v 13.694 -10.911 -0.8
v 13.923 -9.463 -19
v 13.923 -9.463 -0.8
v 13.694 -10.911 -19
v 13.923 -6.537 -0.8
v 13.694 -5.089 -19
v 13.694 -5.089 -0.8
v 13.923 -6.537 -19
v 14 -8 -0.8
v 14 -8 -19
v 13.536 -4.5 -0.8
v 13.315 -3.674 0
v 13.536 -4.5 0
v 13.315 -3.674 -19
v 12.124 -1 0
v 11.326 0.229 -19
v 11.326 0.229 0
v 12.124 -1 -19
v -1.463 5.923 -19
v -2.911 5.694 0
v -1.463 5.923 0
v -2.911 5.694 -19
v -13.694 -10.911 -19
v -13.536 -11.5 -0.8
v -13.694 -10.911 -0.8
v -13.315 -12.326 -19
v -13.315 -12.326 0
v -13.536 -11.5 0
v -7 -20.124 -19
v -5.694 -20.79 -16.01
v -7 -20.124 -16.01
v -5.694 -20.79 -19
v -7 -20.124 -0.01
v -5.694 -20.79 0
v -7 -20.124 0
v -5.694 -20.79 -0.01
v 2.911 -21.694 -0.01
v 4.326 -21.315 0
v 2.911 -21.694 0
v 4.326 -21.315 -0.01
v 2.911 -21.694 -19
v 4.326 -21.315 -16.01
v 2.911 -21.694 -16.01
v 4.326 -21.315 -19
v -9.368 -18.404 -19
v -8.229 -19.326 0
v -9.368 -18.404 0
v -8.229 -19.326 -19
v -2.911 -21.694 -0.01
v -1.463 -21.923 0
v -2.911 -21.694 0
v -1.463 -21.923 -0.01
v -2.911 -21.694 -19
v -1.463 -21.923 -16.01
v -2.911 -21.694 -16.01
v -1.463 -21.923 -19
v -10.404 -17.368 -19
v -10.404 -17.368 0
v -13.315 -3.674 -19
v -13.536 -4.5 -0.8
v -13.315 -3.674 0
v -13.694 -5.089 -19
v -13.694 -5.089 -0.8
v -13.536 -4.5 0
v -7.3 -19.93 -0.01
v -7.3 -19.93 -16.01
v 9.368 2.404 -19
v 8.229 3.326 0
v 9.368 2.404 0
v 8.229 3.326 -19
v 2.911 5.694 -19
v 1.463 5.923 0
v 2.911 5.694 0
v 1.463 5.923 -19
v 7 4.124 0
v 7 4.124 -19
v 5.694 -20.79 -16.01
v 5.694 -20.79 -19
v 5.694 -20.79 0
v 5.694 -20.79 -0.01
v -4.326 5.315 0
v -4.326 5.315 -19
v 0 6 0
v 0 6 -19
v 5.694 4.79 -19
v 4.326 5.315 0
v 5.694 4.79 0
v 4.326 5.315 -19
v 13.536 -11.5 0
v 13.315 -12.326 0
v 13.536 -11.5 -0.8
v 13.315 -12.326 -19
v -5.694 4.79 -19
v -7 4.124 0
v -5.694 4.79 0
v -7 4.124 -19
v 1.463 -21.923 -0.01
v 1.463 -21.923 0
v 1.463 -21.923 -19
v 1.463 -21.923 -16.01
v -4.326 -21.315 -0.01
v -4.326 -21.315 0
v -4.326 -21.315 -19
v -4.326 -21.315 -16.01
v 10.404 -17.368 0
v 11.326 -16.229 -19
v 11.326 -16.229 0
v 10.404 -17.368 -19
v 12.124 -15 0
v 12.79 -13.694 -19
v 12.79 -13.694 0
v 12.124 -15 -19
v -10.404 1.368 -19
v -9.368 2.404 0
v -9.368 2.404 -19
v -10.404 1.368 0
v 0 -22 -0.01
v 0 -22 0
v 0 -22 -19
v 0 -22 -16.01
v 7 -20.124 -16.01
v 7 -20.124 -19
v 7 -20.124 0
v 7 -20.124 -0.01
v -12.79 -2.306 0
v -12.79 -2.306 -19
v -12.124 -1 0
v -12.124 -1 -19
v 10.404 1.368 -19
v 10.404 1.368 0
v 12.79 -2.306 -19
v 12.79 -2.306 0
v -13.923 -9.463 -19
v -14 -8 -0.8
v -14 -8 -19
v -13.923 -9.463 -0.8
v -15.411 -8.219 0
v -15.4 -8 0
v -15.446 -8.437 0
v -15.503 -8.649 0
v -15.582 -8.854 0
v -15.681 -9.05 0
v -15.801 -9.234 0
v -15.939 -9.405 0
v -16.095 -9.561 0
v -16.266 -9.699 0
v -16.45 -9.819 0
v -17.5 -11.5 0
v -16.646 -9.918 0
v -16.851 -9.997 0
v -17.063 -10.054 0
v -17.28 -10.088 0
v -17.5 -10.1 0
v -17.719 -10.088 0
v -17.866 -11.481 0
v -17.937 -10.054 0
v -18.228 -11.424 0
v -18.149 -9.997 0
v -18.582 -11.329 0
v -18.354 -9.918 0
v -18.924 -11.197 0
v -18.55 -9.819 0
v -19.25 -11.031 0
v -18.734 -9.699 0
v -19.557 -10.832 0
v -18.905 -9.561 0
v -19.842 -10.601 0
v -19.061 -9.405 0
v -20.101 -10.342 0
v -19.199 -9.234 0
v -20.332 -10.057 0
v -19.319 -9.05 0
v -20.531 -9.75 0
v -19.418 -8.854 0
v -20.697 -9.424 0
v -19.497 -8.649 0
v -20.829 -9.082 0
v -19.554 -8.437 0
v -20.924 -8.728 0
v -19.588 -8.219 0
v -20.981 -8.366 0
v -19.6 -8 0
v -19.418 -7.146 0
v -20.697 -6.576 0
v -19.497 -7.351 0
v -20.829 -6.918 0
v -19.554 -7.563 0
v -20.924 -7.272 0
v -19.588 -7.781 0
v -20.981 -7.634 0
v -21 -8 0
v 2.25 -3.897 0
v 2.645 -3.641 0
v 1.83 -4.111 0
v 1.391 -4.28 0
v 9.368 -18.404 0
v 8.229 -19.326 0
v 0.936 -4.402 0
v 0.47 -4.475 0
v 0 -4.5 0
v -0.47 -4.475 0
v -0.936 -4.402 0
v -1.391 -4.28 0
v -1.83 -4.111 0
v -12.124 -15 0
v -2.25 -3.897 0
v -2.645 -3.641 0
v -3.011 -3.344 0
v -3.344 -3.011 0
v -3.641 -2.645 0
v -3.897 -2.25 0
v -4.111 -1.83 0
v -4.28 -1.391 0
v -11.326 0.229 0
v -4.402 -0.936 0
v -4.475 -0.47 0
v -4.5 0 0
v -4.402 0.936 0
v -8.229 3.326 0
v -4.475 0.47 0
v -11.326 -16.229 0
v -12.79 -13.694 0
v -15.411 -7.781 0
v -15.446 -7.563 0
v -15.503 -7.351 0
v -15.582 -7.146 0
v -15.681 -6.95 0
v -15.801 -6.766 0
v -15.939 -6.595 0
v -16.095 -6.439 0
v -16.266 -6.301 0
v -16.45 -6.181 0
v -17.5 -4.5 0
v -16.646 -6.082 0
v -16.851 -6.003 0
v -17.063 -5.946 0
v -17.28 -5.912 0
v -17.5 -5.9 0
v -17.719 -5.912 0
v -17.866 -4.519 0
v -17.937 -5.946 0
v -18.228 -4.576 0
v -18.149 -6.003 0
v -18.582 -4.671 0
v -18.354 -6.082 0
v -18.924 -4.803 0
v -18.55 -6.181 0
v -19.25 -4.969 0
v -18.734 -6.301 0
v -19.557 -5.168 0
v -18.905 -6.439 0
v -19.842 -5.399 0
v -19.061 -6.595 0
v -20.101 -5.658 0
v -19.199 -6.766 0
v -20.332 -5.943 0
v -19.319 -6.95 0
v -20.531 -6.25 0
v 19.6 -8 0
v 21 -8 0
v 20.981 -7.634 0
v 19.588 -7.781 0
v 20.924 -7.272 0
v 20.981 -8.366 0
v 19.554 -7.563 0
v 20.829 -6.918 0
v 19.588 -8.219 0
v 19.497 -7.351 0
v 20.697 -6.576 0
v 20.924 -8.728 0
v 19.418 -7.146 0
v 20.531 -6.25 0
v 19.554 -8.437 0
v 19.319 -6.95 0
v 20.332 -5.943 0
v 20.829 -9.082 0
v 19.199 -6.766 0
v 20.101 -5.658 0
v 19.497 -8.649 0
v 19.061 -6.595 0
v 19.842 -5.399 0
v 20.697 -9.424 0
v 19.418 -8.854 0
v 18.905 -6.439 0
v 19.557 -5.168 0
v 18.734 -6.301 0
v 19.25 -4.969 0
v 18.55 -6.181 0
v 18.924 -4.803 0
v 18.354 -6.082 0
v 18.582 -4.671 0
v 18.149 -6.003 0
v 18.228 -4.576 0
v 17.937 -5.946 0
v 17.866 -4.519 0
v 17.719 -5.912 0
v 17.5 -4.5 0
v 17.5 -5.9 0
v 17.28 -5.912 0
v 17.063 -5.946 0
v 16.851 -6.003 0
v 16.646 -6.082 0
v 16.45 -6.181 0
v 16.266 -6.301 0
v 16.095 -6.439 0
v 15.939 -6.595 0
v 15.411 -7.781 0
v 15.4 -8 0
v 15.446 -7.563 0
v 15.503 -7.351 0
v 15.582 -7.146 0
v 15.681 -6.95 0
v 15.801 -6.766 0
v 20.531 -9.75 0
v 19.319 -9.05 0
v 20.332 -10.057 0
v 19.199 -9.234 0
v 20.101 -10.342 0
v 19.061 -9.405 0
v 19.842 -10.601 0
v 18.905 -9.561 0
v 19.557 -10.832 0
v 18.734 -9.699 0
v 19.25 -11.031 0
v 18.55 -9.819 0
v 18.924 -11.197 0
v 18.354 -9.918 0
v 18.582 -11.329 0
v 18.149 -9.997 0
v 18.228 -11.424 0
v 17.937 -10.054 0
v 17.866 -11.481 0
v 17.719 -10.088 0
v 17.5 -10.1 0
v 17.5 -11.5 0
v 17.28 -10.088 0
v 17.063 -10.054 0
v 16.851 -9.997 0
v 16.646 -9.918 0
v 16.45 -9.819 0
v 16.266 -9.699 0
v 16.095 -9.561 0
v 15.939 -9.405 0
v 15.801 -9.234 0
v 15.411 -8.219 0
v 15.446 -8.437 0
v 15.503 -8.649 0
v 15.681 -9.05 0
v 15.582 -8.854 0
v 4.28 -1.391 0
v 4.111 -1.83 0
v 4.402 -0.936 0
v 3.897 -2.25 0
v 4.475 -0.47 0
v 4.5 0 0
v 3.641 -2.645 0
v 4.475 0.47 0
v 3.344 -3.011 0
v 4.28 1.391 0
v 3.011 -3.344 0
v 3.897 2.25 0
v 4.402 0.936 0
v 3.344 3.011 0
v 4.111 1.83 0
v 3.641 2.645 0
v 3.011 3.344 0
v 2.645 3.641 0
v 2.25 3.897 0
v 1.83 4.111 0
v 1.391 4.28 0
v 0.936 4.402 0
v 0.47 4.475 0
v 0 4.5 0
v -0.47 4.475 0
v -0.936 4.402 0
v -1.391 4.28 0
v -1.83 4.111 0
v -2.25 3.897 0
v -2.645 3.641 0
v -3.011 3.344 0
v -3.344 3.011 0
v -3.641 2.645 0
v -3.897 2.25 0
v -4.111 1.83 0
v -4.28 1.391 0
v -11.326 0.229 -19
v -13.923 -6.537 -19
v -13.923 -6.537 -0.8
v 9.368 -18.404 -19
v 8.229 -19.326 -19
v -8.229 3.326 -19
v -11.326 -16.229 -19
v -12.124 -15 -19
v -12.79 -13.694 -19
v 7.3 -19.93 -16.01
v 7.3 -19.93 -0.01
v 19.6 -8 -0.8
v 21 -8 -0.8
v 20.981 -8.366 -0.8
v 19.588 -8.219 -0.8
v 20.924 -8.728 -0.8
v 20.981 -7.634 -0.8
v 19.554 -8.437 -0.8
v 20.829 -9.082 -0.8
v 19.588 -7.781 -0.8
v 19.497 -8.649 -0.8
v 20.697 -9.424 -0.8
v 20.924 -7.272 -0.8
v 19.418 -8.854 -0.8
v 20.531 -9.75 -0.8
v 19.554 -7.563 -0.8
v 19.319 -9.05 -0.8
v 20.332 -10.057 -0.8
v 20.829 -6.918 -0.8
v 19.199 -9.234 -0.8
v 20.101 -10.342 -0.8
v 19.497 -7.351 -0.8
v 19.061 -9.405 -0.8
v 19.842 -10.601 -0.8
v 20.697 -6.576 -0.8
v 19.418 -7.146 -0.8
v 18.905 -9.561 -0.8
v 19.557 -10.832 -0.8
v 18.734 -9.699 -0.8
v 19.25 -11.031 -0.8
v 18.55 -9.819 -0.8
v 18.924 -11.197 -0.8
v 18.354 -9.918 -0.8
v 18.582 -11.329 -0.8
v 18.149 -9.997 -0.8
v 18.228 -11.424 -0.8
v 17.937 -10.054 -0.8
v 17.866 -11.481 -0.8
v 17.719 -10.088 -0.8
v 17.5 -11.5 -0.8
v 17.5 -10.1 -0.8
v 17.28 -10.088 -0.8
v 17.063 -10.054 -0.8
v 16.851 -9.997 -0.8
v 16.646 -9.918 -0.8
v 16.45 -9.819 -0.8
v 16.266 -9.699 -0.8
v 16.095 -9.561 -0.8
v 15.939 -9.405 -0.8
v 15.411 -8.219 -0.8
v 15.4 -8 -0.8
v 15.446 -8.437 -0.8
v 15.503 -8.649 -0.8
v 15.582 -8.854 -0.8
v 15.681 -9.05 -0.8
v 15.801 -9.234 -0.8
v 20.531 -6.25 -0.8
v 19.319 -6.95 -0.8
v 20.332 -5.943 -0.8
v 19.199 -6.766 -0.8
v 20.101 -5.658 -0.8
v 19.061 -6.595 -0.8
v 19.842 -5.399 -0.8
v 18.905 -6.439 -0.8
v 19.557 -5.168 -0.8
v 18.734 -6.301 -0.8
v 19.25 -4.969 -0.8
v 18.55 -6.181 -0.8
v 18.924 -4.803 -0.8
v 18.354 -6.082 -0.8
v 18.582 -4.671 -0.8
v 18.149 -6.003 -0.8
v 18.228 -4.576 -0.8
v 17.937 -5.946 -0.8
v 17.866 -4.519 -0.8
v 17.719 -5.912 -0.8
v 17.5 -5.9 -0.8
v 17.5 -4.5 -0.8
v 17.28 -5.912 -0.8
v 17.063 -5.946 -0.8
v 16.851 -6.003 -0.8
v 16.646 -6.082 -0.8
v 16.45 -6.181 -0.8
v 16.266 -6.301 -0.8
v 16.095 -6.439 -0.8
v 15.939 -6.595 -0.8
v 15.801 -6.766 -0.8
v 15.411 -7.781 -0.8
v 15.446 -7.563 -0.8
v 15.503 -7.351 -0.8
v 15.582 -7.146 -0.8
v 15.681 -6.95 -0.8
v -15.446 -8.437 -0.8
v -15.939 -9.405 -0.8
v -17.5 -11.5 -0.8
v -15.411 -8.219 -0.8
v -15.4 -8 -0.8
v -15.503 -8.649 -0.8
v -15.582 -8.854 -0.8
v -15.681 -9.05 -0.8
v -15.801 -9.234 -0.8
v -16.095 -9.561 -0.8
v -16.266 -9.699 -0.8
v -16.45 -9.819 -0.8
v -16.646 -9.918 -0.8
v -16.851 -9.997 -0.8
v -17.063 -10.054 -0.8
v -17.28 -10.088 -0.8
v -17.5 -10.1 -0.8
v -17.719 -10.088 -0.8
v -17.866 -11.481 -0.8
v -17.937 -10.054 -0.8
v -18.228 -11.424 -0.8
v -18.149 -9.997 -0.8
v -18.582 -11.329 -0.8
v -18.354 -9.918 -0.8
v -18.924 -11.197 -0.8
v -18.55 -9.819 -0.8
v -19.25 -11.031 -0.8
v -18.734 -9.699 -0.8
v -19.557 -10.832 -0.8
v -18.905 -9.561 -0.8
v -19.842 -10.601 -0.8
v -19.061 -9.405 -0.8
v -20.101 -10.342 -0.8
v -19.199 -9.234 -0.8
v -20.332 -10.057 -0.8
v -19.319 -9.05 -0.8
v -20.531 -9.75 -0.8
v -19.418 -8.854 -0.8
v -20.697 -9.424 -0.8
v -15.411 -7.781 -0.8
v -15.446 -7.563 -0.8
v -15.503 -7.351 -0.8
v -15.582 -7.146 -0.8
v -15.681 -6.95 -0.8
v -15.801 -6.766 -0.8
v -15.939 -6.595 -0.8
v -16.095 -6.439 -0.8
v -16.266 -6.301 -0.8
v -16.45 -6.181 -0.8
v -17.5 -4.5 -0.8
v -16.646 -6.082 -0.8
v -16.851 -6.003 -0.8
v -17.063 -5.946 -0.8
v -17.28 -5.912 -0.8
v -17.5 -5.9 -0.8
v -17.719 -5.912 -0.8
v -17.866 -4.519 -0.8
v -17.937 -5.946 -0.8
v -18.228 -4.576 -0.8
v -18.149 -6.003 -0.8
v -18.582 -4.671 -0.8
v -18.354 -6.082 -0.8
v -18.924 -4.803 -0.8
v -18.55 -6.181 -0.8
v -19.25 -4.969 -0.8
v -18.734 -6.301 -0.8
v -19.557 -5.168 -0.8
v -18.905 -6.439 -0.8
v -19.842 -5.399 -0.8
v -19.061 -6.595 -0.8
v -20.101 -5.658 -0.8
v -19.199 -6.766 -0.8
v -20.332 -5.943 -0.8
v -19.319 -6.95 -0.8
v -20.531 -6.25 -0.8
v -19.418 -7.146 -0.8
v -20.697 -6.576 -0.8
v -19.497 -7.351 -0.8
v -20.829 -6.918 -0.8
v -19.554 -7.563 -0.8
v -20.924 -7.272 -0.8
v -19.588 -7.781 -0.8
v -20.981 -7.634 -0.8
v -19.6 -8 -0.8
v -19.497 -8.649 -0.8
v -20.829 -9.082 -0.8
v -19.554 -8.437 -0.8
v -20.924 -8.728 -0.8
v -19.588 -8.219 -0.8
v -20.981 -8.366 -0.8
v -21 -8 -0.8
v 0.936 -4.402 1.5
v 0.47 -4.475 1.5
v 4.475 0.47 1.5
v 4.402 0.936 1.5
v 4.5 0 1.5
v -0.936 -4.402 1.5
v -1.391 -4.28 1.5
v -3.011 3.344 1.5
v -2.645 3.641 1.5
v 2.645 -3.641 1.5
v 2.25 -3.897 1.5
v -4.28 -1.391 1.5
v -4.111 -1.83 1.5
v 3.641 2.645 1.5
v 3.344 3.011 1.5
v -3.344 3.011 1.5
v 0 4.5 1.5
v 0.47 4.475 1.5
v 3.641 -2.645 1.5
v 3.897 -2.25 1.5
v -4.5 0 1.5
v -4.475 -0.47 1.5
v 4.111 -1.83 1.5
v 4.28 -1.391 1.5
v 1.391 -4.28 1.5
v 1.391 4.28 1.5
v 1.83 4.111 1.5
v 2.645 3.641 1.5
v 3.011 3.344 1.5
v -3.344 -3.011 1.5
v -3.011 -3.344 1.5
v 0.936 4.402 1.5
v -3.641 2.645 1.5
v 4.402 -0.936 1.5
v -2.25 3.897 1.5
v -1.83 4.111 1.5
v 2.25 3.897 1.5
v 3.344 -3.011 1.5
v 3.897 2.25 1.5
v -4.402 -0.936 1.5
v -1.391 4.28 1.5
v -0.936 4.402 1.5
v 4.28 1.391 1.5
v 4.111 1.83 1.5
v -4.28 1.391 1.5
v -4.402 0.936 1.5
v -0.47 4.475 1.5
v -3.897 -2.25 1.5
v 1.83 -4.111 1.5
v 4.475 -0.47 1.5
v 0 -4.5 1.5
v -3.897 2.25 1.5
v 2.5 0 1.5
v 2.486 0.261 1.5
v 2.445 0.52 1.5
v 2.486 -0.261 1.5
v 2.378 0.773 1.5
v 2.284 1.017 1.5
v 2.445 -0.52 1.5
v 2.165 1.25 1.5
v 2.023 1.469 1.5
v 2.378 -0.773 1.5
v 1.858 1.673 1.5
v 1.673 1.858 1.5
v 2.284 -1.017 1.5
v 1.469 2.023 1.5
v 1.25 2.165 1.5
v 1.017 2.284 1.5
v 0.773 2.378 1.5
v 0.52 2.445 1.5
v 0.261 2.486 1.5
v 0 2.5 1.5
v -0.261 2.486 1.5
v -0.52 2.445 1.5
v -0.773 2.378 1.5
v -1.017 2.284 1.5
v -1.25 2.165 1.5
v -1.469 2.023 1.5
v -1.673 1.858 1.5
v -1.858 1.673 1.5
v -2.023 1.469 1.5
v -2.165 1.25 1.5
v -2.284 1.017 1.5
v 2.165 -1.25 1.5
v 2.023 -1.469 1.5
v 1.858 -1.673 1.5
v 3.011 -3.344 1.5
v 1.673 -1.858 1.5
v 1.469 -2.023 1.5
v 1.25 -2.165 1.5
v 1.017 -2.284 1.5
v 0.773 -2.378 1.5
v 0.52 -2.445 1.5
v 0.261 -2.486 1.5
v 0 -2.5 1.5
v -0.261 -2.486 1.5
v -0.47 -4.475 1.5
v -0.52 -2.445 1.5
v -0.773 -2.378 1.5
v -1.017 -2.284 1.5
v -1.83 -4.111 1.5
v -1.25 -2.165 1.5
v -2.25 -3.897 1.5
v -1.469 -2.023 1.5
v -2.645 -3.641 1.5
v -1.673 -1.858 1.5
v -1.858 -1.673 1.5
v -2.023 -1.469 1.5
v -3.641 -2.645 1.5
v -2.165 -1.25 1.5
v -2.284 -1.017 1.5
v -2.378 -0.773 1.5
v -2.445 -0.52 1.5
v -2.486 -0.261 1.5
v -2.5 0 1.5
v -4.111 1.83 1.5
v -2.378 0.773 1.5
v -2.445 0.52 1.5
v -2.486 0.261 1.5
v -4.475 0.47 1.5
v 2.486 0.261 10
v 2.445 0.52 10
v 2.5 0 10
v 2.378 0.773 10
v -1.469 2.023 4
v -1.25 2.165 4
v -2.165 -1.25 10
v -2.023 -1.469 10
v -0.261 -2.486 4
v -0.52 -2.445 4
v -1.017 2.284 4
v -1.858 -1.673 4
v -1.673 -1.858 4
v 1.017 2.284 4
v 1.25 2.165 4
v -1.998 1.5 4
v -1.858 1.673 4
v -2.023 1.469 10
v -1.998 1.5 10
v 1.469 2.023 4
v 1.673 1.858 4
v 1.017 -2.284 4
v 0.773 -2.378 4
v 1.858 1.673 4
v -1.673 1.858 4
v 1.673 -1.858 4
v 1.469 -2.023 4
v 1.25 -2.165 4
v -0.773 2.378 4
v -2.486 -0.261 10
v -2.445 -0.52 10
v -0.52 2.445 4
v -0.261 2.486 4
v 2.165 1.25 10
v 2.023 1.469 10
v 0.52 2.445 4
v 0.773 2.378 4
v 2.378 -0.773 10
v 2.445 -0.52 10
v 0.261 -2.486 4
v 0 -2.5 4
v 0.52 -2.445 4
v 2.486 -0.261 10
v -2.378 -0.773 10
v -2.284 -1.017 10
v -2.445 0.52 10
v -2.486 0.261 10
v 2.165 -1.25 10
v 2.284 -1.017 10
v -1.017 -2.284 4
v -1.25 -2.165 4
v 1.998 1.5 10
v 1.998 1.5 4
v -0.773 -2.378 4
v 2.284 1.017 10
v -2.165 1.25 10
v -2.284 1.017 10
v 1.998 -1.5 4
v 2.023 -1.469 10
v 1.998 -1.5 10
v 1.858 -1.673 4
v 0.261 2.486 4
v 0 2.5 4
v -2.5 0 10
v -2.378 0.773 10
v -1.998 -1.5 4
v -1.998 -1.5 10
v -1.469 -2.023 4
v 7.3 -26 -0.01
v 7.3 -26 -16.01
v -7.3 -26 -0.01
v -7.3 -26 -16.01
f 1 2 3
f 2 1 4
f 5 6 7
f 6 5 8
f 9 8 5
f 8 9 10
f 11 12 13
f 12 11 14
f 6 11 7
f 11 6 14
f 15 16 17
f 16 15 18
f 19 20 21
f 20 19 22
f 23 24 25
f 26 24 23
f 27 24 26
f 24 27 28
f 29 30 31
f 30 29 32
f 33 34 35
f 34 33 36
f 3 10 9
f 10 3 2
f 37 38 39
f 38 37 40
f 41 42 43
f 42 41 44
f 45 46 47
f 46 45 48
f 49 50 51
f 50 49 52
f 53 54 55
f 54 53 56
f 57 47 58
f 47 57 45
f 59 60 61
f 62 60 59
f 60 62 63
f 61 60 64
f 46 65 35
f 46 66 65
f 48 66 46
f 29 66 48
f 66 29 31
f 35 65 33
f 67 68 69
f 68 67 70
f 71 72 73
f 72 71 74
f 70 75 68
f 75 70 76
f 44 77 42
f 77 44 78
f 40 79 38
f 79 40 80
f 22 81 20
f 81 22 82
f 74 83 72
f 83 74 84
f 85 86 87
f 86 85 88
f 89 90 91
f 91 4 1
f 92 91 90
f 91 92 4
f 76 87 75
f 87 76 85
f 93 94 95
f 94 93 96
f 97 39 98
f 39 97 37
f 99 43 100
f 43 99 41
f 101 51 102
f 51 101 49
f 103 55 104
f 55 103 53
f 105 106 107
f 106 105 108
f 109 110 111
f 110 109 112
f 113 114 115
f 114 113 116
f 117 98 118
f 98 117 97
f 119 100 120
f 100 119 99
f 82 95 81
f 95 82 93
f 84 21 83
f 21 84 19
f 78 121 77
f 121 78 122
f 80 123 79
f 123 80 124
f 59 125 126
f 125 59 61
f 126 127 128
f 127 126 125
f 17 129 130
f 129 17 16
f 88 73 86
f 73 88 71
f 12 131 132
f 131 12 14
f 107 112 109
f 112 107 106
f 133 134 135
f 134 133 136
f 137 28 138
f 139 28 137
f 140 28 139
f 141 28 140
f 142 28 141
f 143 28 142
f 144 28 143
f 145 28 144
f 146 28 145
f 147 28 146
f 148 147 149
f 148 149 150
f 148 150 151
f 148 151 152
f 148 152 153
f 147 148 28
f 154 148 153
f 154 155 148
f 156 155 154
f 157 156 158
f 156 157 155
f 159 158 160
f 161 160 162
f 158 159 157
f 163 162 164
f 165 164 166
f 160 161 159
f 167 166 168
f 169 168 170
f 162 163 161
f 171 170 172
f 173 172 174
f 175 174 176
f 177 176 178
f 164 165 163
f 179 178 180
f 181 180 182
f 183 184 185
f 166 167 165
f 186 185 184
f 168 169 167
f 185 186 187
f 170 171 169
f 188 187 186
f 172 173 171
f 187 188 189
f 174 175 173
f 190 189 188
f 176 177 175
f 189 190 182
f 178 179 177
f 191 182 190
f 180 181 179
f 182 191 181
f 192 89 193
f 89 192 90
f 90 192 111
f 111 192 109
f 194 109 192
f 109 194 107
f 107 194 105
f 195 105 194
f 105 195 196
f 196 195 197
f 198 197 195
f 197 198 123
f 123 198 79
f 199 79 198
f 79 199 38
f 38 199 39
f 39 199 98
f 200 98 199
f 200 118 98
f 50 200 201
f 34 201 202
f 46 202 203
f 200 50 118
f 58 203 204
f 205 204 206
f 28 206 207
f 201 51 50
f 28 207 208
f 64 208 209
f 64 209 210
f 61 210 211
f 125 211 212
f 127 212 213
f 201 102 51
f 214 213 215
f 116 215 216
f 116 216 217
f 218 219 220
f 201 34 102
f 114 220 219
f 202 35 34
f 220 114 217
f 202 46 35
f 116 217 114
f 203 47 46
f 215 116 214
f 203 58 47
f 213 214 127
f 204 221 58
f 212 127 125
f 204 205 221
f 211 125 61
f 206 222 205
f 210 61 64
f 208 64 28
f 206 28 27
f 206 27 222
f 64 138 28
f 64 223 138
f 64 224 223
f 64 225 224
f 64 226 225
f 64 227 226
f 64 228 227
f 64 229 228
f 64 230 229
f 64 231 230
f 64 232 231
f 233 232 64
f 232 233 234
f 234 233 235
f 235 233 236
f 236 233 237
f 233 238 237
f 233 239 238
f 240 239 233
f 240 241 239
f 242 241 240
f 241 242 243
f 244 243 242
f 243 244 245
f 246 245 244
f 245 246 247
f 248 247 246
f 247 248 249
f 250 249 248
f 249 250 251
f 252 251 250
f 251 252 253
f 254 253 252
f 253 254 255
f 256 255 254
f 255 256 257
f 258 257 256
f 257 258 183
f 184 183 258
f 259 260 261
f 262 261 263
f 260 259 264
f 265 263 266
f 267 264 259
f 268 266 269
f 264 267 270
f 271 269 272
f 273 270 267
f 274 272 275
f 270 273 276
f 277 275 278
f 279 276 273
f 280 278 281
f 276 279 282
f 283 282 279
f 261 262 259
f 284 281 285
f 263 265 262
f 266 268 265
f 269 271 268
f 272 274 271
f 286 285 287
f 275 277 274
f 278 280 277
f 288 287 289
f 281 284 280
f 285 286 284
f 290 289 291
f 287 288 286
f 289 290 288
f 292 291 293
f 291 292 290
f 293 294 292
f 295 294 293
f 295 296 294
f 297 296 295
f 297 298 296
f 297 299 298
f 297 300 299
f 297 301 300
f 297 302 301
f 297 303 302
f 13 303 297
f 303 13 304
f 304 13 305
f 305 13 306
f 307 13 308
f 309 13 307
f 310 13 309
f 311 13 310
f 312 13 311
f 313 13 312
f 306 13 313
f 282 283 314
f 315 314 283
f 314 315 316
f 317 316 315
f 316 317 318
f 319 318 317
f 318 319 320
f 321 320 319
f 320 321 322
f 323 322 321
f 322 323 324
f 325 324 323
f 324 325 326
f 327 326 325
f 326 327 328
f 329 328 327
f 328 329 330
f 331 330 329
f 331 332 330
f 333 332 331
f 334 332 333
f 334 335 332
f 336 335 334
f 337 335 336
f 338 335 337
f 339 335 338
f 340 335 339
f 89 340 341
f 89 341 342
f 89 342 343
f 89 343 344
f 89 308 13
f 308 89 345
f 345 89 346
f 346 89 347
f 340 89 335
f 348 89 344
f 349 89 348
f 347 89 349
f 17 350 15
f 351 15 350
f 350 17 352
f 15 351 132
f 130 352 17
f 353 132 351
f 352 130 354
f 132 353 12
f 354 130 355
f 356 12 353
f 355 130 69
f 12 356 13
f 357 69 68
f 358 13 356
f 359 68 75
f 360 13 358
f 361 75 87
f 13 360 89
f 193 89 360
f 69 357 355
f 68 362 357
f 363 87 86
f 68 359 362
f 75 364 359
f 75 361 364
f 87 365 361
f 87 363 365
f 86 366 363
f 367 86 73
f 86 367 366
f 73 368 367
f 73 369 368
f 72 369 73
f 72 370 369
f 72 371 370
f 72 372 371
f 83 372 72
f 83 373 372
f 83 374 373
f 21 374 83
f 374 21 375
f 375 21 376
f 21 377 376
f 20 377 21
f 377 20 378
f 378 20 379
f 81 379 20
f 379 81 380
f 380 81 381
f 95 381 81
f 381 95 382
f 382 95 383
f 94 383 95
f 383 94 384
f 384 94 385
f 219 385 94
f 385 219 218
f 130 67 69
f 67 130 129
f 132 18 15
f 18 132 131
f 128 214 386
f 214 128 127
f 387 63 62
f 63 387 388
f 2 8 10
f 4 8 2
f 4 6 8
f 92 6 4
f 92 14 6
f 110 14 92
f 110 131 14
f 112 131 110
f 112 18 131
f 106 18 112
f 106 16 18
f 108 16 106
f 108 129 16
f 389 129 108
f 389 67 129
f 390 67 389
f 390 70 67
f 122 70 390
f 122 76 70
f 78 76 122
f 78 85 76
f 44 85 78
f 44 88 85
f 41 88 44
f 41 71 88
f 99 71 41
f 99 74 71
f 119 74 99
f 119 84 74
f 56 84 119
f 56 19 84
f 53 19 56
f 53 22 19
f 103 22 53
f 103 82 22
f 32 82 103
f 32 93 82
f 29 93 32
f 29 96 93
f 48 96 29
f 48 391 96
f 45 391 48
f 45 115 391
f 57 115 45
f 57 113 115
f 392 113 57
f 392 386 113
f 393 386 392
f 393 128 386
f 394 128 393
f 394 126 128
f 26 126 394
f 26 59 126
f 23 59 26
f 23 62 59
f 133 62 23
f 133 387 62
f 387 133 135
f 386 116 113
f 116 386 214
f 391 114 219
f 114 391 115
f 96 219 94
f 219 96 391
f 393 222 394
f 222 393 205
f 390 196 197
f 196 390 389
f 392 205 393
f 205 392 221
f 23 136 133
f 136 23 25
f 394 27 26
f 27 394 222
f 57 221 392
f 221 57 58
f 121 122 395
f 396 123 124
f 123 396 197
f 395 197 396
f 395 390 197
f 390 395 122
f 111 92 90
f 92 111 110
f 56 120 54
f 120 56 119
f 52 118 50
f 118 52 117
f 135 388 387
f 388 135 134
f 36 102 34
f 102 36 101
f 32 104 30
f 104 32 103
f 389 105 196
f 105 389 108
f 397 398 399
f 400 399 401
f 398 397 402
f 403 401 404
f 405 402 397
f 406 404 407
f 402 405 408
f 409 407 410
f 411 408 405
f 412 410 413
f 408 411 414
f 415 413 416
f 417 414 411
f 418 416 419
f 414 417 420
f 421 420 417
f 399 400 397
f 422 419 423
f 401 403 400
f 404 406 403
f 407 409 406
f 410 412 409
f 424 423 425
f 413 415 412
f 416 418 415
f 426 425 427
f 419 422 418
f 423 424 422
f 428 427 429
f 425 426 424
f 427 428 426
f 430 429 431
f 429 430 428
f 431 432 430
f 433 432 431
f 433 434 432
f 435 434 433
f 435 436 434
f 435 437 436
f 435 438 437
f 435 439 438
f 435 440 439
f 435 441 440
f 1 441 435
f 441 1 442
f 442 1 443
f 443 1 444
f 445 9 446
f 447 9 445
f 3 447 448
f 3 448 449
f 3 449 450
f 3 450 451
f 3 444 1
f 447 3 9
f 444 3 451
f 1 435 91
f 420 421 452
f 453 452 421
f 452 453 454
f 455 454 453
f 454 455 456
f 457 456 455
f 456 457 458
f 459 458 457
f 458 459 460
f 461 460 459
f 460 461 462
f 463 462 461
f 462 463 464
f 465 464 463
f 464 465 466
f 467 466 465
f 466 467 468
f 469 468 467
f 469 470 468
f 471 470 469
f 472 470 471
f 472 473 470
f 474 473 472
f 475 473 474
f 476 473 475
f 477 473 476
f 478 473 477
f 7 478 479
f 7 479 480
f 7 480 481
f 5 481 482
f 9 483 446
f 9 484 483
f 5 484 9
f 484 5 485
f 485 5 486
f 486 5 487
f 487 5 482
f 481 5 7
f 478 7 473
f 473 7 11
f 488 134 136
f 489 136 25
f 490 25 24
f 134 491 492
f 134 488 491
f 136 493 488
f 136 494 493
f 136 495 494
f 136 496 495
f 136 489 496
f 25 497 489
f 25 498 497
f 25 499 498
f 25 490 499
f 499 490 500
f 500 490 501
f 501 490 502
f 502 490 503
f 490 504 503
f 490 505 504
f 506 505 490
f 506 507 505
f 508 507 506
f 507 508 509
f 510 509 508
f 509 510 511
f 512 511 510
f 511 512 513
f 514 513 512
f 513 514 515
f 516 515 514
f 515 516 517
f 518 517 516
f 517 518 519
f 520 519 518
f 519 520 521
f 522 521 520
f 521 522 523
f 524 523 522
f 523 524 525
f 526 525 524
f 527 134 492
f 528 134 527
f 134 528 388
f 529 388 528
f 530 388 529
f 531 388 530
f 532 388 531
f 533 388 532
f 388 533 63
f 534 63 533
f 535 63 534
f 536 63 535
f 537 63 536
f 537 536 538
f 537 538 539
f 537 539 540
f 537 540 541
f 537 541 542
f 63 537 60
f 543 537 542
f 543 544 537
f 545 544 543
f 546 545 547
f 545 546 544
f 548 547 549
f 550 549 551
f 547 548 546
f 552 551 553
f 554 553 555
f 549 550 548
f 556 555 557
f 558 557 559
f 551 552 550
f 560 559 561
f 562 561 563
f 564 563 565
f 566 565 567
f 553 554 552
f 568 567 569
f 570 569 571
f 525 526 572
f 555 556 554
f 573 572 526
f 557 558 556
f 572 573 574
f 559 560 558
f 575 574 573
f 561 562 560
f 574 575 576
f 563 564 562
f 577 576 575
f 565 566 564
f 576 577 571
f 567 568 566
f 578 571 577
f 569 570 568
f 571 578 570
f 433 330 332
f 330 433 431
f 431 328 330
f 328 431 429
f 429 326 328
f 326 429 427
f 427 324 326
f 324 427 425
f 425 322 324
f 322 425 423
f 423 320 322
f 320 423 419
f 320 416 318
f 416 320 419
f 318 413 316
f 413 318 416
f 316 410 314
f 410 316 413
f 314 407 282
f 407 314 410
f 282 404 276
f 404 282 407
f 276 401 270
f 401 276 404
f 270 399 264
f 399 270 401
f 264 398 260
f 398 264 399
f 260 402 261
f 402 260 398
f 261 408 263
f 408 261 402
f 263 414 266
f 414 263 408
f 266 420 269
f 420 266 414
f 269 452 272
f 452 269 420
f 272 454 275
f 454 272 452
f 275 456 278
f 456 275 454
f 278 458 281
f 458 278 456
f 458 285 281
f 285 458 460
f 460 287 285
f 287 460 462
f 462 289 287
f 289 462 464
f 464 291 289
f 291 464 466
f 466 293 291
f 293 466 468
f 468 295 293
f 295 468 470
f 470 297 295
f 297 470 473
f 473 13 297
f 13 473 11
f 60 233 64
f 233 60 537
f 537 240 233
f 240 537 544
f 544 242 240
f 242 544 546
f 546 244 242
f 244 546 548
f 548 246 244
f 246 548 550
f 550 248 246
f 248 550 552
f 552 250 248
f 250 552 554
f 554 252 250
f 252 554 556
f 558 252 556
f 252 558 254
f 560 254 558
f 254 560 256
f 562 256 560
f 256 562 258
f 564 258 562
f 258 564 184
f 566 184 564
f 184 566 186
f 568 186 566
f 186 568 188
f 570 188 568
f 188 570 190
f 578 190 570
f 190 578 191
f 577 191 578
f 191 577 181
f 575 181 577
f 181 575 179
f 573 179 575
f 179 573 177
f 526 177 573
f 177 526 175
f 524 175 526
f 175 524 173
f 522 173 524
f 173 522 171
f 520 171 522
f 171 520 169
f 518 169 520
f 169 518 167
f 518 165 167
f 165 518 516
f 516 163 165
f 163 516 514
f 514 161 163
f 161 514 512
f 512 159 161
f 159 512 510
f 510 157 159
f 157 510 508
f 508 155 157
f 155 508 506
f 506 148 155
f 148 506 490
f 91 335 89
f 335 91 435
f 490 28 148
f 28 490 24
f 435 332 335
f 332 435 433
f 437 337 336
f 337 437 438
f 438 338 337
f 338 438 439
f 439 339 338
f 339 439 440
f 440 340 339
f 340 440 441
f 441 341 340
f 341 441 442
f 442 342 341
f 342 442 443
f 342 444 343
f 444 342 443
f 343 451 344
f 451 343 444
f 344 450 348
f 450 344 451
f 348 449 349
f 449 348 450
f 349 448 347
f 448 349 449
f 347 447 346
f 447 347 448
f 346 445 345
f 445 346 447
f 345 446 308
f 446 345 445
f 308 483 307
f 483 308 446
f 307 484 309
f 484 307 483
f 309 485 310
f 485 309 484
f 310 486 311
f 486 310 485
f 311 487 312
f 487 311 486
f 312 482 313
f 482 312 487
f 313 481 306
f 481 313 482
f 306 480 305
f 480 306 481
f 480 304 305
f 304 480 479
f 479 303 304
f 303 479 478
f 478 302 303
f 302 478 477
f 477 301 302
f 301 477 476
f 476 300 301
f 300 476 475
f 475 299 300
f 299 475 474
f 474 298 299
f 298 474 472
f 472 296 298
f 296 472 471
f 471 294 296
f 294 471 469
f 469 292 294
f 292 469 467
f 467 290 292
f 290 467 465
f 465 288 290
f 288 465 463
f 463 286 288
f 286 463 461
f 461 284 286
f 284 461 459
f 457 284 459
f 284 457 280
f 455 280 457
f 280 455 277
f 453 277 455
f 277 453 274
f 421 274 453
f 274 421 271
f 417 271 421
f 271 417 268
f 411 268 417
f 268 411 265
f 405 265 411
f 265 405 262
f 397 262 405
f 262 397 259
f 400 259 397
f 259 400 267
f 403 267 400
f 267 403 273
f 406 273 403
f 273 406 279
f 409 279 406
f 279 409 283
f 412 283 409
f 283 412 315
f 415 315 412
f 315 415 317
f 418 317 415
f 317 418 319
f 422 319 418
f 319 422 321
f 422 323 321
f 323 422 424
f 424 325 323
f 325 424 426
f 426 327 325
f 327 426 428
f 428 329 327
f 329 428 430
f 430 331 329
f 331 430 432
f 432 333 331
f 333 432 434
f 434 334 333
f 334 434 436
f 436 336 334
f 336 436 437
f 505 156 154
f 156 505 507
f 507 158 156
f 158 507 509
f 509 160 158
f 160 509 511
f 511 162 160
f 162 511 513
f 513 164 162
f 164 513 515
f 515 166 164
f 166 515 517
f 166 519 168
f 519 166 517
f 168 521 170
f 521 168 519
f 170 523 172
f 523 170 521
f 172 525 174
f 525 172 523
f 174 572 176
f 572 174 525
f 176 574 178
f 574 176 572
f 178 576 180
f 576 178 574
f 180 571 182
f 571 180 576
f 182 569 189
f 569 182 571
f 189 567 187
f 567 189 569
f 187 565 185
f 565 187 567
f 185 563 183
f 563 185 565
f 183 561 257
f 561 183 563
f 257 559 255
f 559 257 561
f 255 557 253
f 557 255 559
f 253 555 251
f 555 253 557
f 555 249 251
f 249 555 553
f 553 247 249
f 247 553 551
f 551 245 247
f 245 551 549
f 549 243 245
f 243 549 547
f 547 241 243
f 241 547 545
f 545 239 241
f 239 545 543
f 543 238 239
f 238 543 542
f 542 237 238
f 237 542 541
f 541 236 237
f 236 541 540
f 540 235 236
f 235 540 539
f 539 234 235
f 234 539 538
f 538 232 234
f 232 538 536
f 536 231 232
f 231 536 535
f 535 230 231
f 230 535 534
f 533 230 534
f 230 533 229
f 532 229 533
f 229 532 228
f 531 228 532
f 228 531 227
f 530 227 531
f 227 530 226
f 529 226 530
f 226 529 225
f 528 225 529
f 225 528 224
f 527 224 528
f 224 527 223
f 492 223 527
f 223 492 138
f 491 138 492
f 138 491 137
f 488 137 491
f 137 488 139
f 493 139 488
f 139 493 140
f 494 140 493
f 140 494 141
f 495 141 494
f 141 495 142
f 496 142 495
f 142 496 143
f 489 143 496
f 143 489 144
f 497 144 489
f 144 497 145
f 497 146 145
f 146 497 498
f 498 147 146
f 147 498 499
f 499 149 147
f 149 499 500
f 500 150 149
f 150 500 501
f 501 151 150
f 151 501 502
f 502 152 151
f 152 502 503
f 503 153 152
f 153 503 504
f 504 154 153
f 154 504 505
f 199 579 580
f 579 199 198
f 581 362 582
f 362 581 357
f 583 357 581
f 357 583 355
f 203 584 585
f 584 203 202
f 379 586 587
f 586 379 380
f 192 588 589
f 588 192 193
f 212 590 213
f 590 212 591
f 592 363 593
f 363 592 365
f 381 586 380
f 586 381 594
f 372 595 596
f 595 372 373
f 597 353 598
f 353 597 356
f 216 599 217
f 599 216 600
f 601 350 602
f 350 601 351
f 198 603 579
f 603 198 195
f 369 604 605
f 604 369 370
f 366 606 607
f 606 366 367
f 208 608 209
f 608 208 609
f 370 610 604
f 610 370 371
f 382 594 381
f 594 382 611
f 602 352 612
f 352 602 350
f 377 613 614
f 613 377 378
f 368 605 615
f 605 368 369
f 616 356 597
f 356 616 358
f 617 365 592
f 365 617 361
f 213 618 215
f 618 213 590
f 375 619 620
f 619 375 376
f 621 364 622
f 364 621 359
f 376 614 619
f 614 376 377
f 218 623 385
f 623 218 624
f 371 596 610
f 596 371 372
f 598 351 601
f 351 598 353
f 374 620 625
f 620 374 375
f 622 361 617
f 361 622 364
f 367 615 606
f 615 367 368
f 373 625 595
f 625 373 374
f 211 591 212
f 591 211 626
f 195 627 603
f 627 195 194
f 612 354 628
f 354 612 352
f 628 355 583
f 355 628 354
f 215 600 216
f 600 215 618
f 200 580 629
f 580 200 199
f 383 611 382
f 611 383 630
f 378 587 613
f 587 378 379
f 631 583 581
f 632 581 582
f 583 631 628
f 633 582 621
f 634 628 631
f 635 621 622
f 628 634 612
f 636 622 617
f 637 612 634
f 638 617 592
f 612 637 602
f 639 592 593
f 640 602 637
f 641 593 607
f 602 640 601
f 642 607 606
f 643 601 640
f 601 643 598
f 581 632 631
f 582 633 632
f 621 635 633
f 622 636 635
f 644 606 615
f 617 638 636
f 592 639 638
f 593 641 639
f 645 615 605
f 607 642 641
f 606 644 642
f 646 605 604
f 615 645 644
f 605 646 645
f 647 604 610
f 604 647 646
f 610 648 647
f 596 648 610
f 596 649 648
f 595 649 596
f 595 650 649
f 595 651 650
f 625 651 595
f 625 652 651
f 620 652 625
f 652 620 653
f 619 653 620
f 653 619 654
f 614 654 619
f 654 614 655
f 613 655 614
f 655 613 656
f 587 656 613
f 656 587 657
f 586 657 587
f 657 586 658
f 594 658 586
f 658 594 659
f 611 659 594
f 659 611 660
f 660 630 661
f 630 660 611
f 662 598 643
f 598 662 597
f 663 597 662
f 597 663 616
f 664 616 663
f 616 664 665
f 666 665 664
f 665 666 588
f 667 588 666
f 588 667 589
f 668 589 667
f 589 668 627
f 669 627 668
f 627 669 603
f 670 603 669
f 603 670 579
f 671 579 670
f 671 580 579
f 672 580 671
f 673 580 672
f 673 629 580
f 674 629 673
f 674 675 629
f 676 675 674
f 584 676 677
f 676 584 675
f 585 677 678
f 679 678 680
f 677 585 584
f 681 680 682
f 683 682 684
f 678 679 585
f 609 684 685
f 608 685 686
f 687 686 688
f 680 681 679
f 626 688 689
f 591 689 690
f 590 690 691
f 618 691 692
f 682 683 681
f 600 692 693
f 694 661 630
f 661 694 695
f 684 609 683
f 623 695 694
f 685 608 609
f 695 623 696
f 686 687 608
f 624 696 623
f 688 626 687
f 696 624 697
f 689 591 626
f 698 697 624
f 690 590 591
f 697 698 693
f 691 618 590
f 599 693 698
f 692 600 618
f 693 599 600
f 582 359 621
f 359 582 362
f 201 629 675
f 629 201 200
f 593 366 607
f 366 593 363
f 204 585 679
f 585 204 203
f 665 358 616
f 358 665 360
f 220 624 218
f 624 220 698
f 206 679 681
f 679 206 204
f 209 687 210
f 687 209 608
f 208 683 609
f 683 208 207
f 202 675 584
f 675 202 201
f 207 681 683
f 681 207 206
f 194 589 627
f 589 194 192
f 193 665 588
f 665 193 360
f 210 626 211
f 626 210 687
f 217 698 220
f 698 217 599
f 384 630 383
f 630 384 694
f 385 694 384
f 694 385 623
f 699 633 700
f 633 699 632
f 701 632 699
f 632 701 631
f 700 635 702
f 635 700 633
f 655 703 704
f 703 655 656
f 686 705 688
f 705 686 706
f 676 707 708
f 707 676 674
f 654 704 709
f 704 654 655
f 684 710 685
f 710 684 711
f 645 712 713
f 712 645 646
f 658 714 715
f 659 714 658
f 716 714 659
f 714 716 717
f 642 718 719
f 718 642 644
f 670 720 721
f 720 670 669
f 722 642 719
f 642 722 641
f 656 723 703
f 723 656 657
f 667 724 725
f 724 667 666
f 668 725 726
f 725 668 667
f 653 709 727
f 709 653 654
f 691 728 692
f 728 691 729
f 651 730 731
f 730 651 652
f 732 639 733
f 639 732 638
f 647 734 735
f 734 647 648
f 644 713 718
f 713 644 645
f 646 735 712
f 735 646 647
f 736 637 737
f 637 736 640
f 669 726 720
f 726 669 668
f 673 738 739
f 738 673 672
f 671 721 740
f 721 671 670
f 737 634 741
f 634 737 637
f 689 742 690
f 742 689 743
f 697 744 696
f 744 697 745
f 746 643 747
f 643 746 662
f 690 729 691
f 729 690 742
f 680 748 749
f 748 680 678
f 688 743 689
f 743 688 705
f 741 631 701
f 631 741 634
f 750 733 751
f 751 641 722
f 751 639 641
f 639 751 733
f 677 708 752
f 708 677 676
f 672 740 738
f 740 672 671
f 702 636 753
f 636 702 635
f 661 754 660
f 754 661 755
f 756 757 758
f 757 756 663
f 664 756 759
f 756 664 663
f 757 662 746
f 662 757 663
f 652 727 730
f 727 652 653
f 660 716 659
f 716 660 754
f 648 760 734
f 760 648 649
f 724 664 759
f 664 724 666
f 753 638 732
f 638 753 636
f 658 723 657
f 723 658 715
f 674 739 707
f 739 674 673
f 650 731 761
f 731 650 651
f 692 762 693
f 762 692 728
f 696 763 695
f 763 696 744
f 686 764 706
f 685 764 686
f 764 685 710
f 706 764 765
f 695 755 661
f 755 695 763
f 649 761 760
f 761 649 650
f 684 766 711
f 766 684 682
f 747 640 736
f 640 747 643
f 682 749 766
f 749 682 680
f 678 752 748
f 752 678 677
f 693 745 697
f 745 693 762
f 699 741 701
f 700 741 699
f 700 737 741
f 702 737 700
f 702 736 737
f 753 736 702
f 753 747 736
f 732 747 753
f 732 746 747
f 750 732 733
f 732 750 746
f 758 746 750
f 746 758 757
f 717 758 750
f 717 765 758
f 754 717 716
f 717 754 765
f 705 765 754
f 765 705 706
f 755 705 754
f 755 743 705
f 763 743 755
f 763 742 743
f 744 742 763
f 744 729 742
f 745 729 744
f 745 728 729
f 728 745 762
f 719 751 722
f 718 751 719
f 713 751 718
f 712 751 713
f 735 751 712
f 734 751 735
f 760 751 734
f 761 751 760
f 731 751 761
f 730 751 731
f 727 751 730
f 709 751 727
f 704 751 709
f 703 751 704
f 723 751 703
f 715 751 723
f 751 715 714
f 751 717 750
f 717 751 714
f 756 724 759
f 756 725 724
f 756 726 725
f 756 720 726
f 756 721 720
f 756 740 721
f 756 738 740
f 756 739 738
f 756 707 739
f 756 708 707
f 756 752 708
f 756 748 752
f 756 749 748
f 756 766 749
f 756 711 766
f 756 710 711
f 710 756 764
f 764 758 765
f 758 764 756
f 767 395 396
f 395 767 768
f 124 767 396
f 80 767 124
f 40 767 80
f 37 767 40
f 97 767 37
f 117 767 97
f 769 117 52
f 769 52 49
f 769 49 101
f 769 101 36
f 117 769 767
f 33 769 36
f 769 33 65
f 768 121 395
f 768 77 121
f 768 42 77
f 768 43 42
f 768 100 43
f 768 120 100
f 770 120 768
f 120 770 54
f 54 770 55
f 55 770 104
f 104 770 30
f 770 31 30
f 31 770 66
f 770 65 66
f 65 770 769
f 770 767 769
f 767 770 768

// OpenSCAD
// file: ../28byj-48.scad
/*
   Copyright 2015 Scott Bezek

   Licensed under the Apache License, Version 2.0 (the "License");
   you may not use this file except in compliance with the License.
   You may obtain a copy of the License at

       http://www.apache.org/licenses/LICENSE-2.0

   Unless required by applicable law or agreed to in writing, software
   distributed under the License is distributed on an "AS IS" BASIS,
   WITHOUT WARRANTIES OR CONDITIONS OF ANY KIND, either express or implied.
   See the License for the specific language governing permissions and
   limitations under the License.
*/

// Basic 28BYJ-48 model based on various dimensioned drawings.
// Origin is centered on the shaft, on the front face of the motor, with the shaft in the +z direction
module Stepper28BYJ48() {
    $fn = 60;

    eps = 0.01;
    chassis_radius = 28/2;
    chassis_height = 19;
    shaft_offset = 8;
    mount_outer_radius = 3.5;
    mount_hole_radius = 4.2/2;
    mount_center_offset = 35/2;
    mount_bracket_height = 0.8;

    shaft_collar_radius = 9/2;
    shaft_collar_height = 1.5;

    shaft_radius = 5/2;
    shaft_height = 10;
    shaft_slotted_width = 3;
    shaft_slotted_height = 6;

    backpack_width = 14.6;
    backpack_extent = 18; // seen values from 17-18
    backpack_height = 16;

    gray = [0.7, 0.7, 0.7];
    gold = "gold";
    blue = "blue";

    module mounting_holes() {
        linear_extrude(height=mount_bracket_height) {
        difference() {
            hull() {
                translate([mount_center_offset, 0]) {
                    circle(r=mount_outer_radius);
                }
                translate([-mount_center_offset, 0]) {
                    circle(r=mount_outer_radius);
                }
            }

            translate([mount_center_offset, 0]) {
                circle(r=mount_hole_radius);
            }
            translate([-mount_center_offset, 0]) {
                circle(r=mount_hole_radius);
            }
        }
        }
    }

    module shaft_collar() {
        cylinder(r=shaft_collar_radius, h=shaft_collar_height + eps);
    }

    module shaft() {
        color(gold) {
            difference() {
                cylinder(r=shaft_radius, h=shaft_height);
                translate([-(shaft_radius + eps), shaft_slotted_width / 2, shaft_height - shaft_slotted_height]) {
                    cube([(shaft_radius+eps)*2, shaft_radius, shaft_slotted_height+eps]);
                }
                translate([-(shaft_radius + eps), - shaft_radius - (shaft_slotted_width / 2), shaft_height - shaft_slotted_height]) {
                    cube([(shaft_radius+eps)*2, shaft_radius, shaft_slotted_height+eps]);
                }
            }
        }
    }

    module chassis() {
        color(gray) {
            translate([0, 0, -chassis_height]) {
                cylinder(r=chassis_radius, h=chassis_height);
            }
            translate([0, 0, -mount_bracket_height]) {
                mounting_holes();
            }
            translate([0, shaft_offset, -eps]) {
                shaft_collar();
            }
        }
    }

    module backpack() {
        color(blue) {
            translate([-backpack_width/2, 0, -backpack_height - eps]) {
                cube([backpack_width, backpack_extent, backpack_height]);
            }
        }
    }

    translate([0, -shaft_offset, 0]) {
        chassis();
        translate([0, shaft_offset, 0]) {
            shaft();
        }
        translate([0, -backpack_extent, 0]) {
            backpack();
        }
    }
}

Stepper28BYJ48();
// main file
/*
   Copyright 2015-2016 Scott Bezek and the splitflap contributors

   Licensed under the Apache License, Version 2.0 (the "License");
   you may not use this file except in compliance with the License.
   You may obtain a copy of the License at

       http://www.apache.org/licenses/LICENSE-2.0

   Unless required by applicable law or agreed to in writing, software
   distributed under the License is distributed on an "AS IS" BASIS,
   WITHOUT WARRANTIES OR CONDITIONS OF ANY KIND, either express or implied.
   See the License for the specific language governing permissions and
   limitations under the License.
*/

include<../28byj-48.scad>;

motor_shaft_under_radius = 0.08;  // interference fit
motor_slop_radius = 3;

// holes for 28byj-48 motor, centered around motor shaft
module motor_mount() {
    circle(r=28byj48_shaft_radius+motor_slop_radius, $fn=30);
    translate([-28byj48_mount_center_offset, -8]) {
        circle(r=motor_mount_hole_radius, $fn=30);
    }
    translate([28byj48_mount_center_offset, -8]) {
        circle(r=motor_mount_hole_radius, $fn=30);
    }

    hull() {
        x = -28byj48_chassis_radius - motor_hole_slop/2 + motor_window_radius;
        y = [-28byj48_shaft_offset - motor_backpack_extent - motor_hole_slop/2 + motor_window_radius,
            -28byj48_shaft_offset + 28byj48_chassis_radius + motor_hole_slop/2 - motor_window_radius];

        translate([ x, y[0], 0]) circle(r=motor_window_radius, $fn=40);
        translate([-x, y[1], 0]) circle(r=motor_window_radius, $fn=40);
        translate([-x, y[0], 0]) circle(r=motor_window_radius, $fn=40);
        translate([ x, y[1], 0]) circle(r=motor_window_radius, $fn=40);
    }
}

// double-flatted motor shaft of 28byj-48 motor (2D)
module motor_shaft() {
    union() {
        intersection() {
            circle(r=28byj48_shaft_radius-motor_shaft_under_radius, $fn=50);
            square([28byj48_shaft_radius*2, 3], center=true);
        }
        square([28byj48_shaft_radius/3, 28byj48_shaft_radius*4], center=true);
    }
}
